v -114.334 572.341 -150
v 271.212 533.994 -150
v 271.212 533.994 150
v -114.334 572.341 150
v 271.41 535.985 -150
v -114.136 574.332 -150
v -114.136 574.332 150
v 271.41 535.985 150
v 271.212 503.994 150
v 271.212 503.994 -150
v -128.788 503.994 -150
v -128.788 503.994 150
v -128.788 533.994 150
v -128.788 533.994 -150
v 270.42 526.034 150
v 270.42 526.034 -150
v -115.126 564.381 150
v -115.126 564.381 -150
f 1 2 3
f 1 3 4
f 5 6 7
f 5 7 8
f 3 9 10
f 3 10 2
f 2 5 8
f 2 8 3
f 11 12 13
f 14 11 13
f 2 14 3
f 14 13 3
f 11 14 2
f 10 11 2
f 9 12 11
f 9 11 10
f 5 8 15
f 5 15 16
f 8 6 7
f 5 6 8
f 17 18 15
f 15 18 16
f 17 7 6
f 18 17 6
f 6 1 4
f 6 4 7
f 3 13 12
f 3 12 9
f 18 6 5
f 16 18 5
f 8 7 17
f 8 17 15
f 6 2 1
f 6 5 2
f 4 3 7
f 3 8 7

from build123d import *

# Parameters (mm, degrees)
SKETCH1_W                         = 400
SKETCH1_H                         = 30
BOSS_EXTRUDE1_DEPTH               = 150
ESTRUSIONE_ESTRUSIONE5_DEPTH      = 150
ESTRUSIONE_ESTRUSIONE5_DEPTH_BACK = 150
SKETCH3_W                         = 387.448704946
SKETCH3_H                         = 300
BOSS_EXTRUDE2_DEPTH               = 10


with BuildPart() as part:
    # Sketch1 → Boss-Extrude1 (new, symmetric)
    with BuildSketch(Plane.XY):
        with Locations((71.211975439, 518.994449049)):
            Rectangle(SKETCH1_W, SKETCH1_H)
    extrude(amount=BOSS_EXTRUDE1_DEPTH, both=True)


with BuildPart() as body_2:
    # Schizzo9 → Estrusione-Estrusione5 (new, two sides: drawn at the far end of the back side and taken through both)
    with BuildSketch(Plane.XY.offset(-ESTRUSIONE_ESTRUSIONE5_DEPTH_BACK)):
        Polygon((271.211975439, 533.994449049), (-114.334405835, 572.341376579), (-114.136460006, 574.331556834), (271.409921268, 535.984629305), align=None)
    extrude(amount=ESTRUSIONE_ESTRUSIONE5_DEPTH + ESTRUSIONE_ESTRUSIONE5_DEPTH_BACK)


with BuildPart() as body_3:
    # Sketch3 → Boss-Extrude2 (new body)
    with BuildSketch(Plane(origin=(55.446135433, 557.464658807, 0), x_dir=(0.9950901276791769, -0.09897291445359903, 0), z_dir=(0.09897291445359903, 0.9950901276791769, 0))):
        with Locations((23.30501987, 0)):
            Rectangle(SKETCH3_W, SKETCH3_H)
    extrude(amount=-BOSS_EXTRUDE2_DEPTH)


solid = Compound([part.part, body_2.part, body_3.part])
